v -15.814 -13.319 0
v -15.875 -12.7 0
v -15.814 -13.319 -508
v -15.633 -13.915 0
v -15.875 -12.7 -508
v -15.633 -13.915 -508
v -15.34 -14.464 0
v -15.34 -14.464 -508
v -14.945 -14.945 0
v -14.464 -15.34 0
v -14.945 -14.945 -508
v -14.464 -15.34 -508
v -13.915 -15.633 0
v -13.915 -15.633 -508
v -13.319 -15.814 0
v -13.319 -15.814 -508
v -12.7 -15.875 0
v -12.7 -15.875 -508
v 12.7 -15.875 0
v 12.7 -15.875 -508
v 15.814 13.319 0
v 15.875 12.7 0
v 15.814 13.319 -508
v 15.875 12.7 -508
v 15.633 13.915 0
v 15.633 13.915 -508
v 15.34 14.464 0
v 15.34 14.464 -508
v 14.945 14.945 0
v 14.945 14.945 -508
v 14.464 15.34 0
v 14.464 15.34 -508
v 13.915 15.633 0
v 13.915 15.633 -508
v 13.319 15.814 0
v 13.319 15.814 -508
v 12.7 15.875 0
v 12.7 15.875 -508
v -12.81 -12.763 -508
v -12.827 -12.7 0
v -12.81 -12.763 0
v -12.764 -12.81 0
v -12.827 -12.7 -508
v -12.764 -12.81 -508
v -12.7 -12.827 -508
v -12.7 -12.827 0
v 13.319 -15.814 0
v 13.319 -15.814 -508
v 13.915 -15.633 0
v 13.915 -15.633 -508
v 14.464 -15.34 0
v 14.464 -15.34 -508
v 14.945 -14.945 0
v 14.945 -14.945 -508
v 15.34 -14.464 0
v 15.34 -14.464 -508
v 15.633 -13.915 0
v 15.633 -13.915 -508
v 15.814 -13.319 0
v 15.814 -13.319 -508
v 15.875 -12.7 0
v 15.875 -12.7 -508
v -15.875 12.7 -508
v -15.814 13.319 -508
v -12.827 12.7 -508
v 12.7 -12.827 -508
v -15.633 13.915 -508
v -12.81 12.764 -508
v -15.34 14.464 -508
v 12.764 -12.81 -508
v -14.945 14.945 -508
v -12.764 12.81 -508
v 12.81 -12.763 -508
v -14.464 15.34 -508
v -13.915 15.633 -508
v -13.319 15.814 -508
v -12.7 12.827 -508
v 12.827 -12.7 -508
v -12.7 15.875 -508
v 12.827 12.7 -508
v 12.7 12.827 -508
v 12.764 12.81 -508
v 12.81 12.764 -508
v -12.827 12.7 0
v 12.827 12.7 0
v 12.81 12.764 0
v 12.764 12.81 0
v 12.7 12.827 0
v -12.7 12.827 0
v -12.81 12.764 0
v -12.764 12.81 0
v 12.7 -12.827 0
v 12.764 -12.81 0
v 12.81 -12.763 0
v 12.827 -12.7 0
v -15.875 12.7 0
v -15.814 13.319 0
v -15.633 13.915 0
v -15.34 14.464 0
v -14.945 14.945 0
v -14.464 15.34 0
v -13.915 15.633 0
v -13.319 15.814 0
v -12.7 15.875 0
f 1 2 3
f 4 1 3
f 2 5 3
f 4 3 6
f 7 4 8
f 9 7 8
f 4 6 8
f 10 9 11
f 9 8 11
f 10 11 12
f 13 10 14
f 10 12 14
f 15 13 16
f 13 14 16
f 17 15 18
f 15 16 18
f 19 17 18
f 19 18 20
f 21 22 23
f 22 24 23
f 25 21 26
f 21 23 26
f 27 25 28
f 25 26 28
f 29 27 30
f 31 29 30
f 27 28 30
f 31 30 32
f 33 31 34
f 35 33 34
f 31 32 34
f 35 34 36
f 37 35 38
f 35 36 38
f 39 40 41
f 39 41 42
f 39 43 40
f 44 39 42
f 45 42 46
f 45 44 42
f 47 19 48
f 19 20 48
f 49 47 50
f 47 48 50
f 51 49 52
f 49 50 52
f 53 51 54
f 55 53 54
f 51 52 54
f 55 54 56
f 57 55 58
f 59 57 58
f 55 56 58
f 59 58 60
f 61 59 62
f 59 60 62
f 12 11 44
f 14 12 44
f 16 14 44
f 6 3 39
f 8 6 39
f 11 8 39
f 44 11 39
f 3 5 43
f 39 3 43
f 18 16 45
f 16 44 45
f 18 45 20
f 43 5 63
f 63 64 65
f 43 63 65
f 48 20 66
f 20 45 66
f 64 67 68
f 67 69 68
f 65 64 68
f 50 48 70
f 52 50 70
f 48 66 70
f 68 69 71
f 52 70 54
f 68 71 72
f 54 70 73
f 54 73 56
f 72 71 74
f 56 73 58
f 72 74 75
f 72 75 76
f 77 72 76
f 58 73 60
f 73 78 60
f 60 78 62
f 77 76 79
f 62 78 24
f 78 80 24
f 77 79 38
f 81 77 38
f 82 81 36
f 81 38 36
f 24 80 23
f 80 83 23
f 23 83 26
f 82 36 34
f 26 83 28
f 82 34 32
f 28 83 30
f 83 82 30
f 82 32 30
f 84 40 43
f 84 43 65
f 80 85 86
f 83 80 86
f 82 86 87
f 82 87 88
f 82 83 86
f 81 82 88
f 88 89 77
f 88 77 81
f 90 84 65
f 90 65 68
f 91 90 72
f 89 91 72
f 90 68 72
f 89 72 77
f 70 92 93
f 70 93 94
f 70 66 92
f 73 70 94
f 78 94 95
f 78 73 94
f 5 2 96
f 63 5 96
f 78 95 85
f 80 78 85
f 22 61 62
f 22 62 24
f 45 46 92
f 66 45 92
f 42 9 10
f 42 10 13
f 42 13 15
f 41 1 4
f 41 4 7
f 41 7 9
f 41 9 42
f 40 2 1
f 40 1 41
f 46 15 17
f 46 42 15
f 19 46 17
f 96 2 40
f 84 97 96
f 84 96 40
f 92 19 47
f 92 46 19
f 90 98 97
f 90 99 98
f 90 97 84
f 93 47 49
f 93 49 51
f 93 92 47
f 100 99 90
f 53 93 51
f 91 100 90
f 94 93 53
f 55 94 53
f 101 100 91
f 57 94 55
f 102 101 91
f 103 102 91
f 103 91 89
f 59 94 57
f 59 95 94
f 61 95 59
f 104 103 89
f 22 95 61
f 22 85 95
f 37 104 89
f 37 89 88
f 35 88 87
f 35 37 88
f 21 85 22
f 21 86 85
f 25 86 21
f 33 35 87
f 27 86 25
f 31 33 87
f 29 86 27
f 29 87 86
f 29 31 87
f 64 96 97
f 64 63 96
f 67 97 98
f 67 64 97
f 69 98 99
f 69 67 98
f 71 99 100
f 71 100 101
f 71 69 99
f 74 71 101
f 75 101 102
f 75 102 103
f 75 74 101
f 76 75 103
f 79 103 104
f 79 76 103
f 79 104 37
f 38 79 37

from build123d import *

# Parameters (mm, degrees)
F0_W     = 31.75
F0_H     = 31.75
F1_DEPTH = 508
F2_R     = 3.175
F3_T     = -3.048


with BuildPart() as f1:
    # F0 (on Top) → F1 (new body)
    with BuildSketch(Plane.XY):
        Rectangle(F0_W, F0_H)
    extrude(amount=-F1_DEPTH)

    # F2
    f2_edges = [f1.edges().sort_by_distance(p)[0] for p in [
        (-15.875, 15.875, -254),
        (-15.875, -15.875, -254),
        (15.875, 15.875, -254),
        (15.875, -15.875, -254),
    ]]
    fillet(f2_edges, radius=F2_R)

    # F3
    f3_openings = [f1.faces().sort_by_distance(p)[0] for p in [
        (0, 0, 0),
        (0, 0, -508),
    ]]
    offset(amount=F3_T, openings=f3_openings)


solid = f1.part
